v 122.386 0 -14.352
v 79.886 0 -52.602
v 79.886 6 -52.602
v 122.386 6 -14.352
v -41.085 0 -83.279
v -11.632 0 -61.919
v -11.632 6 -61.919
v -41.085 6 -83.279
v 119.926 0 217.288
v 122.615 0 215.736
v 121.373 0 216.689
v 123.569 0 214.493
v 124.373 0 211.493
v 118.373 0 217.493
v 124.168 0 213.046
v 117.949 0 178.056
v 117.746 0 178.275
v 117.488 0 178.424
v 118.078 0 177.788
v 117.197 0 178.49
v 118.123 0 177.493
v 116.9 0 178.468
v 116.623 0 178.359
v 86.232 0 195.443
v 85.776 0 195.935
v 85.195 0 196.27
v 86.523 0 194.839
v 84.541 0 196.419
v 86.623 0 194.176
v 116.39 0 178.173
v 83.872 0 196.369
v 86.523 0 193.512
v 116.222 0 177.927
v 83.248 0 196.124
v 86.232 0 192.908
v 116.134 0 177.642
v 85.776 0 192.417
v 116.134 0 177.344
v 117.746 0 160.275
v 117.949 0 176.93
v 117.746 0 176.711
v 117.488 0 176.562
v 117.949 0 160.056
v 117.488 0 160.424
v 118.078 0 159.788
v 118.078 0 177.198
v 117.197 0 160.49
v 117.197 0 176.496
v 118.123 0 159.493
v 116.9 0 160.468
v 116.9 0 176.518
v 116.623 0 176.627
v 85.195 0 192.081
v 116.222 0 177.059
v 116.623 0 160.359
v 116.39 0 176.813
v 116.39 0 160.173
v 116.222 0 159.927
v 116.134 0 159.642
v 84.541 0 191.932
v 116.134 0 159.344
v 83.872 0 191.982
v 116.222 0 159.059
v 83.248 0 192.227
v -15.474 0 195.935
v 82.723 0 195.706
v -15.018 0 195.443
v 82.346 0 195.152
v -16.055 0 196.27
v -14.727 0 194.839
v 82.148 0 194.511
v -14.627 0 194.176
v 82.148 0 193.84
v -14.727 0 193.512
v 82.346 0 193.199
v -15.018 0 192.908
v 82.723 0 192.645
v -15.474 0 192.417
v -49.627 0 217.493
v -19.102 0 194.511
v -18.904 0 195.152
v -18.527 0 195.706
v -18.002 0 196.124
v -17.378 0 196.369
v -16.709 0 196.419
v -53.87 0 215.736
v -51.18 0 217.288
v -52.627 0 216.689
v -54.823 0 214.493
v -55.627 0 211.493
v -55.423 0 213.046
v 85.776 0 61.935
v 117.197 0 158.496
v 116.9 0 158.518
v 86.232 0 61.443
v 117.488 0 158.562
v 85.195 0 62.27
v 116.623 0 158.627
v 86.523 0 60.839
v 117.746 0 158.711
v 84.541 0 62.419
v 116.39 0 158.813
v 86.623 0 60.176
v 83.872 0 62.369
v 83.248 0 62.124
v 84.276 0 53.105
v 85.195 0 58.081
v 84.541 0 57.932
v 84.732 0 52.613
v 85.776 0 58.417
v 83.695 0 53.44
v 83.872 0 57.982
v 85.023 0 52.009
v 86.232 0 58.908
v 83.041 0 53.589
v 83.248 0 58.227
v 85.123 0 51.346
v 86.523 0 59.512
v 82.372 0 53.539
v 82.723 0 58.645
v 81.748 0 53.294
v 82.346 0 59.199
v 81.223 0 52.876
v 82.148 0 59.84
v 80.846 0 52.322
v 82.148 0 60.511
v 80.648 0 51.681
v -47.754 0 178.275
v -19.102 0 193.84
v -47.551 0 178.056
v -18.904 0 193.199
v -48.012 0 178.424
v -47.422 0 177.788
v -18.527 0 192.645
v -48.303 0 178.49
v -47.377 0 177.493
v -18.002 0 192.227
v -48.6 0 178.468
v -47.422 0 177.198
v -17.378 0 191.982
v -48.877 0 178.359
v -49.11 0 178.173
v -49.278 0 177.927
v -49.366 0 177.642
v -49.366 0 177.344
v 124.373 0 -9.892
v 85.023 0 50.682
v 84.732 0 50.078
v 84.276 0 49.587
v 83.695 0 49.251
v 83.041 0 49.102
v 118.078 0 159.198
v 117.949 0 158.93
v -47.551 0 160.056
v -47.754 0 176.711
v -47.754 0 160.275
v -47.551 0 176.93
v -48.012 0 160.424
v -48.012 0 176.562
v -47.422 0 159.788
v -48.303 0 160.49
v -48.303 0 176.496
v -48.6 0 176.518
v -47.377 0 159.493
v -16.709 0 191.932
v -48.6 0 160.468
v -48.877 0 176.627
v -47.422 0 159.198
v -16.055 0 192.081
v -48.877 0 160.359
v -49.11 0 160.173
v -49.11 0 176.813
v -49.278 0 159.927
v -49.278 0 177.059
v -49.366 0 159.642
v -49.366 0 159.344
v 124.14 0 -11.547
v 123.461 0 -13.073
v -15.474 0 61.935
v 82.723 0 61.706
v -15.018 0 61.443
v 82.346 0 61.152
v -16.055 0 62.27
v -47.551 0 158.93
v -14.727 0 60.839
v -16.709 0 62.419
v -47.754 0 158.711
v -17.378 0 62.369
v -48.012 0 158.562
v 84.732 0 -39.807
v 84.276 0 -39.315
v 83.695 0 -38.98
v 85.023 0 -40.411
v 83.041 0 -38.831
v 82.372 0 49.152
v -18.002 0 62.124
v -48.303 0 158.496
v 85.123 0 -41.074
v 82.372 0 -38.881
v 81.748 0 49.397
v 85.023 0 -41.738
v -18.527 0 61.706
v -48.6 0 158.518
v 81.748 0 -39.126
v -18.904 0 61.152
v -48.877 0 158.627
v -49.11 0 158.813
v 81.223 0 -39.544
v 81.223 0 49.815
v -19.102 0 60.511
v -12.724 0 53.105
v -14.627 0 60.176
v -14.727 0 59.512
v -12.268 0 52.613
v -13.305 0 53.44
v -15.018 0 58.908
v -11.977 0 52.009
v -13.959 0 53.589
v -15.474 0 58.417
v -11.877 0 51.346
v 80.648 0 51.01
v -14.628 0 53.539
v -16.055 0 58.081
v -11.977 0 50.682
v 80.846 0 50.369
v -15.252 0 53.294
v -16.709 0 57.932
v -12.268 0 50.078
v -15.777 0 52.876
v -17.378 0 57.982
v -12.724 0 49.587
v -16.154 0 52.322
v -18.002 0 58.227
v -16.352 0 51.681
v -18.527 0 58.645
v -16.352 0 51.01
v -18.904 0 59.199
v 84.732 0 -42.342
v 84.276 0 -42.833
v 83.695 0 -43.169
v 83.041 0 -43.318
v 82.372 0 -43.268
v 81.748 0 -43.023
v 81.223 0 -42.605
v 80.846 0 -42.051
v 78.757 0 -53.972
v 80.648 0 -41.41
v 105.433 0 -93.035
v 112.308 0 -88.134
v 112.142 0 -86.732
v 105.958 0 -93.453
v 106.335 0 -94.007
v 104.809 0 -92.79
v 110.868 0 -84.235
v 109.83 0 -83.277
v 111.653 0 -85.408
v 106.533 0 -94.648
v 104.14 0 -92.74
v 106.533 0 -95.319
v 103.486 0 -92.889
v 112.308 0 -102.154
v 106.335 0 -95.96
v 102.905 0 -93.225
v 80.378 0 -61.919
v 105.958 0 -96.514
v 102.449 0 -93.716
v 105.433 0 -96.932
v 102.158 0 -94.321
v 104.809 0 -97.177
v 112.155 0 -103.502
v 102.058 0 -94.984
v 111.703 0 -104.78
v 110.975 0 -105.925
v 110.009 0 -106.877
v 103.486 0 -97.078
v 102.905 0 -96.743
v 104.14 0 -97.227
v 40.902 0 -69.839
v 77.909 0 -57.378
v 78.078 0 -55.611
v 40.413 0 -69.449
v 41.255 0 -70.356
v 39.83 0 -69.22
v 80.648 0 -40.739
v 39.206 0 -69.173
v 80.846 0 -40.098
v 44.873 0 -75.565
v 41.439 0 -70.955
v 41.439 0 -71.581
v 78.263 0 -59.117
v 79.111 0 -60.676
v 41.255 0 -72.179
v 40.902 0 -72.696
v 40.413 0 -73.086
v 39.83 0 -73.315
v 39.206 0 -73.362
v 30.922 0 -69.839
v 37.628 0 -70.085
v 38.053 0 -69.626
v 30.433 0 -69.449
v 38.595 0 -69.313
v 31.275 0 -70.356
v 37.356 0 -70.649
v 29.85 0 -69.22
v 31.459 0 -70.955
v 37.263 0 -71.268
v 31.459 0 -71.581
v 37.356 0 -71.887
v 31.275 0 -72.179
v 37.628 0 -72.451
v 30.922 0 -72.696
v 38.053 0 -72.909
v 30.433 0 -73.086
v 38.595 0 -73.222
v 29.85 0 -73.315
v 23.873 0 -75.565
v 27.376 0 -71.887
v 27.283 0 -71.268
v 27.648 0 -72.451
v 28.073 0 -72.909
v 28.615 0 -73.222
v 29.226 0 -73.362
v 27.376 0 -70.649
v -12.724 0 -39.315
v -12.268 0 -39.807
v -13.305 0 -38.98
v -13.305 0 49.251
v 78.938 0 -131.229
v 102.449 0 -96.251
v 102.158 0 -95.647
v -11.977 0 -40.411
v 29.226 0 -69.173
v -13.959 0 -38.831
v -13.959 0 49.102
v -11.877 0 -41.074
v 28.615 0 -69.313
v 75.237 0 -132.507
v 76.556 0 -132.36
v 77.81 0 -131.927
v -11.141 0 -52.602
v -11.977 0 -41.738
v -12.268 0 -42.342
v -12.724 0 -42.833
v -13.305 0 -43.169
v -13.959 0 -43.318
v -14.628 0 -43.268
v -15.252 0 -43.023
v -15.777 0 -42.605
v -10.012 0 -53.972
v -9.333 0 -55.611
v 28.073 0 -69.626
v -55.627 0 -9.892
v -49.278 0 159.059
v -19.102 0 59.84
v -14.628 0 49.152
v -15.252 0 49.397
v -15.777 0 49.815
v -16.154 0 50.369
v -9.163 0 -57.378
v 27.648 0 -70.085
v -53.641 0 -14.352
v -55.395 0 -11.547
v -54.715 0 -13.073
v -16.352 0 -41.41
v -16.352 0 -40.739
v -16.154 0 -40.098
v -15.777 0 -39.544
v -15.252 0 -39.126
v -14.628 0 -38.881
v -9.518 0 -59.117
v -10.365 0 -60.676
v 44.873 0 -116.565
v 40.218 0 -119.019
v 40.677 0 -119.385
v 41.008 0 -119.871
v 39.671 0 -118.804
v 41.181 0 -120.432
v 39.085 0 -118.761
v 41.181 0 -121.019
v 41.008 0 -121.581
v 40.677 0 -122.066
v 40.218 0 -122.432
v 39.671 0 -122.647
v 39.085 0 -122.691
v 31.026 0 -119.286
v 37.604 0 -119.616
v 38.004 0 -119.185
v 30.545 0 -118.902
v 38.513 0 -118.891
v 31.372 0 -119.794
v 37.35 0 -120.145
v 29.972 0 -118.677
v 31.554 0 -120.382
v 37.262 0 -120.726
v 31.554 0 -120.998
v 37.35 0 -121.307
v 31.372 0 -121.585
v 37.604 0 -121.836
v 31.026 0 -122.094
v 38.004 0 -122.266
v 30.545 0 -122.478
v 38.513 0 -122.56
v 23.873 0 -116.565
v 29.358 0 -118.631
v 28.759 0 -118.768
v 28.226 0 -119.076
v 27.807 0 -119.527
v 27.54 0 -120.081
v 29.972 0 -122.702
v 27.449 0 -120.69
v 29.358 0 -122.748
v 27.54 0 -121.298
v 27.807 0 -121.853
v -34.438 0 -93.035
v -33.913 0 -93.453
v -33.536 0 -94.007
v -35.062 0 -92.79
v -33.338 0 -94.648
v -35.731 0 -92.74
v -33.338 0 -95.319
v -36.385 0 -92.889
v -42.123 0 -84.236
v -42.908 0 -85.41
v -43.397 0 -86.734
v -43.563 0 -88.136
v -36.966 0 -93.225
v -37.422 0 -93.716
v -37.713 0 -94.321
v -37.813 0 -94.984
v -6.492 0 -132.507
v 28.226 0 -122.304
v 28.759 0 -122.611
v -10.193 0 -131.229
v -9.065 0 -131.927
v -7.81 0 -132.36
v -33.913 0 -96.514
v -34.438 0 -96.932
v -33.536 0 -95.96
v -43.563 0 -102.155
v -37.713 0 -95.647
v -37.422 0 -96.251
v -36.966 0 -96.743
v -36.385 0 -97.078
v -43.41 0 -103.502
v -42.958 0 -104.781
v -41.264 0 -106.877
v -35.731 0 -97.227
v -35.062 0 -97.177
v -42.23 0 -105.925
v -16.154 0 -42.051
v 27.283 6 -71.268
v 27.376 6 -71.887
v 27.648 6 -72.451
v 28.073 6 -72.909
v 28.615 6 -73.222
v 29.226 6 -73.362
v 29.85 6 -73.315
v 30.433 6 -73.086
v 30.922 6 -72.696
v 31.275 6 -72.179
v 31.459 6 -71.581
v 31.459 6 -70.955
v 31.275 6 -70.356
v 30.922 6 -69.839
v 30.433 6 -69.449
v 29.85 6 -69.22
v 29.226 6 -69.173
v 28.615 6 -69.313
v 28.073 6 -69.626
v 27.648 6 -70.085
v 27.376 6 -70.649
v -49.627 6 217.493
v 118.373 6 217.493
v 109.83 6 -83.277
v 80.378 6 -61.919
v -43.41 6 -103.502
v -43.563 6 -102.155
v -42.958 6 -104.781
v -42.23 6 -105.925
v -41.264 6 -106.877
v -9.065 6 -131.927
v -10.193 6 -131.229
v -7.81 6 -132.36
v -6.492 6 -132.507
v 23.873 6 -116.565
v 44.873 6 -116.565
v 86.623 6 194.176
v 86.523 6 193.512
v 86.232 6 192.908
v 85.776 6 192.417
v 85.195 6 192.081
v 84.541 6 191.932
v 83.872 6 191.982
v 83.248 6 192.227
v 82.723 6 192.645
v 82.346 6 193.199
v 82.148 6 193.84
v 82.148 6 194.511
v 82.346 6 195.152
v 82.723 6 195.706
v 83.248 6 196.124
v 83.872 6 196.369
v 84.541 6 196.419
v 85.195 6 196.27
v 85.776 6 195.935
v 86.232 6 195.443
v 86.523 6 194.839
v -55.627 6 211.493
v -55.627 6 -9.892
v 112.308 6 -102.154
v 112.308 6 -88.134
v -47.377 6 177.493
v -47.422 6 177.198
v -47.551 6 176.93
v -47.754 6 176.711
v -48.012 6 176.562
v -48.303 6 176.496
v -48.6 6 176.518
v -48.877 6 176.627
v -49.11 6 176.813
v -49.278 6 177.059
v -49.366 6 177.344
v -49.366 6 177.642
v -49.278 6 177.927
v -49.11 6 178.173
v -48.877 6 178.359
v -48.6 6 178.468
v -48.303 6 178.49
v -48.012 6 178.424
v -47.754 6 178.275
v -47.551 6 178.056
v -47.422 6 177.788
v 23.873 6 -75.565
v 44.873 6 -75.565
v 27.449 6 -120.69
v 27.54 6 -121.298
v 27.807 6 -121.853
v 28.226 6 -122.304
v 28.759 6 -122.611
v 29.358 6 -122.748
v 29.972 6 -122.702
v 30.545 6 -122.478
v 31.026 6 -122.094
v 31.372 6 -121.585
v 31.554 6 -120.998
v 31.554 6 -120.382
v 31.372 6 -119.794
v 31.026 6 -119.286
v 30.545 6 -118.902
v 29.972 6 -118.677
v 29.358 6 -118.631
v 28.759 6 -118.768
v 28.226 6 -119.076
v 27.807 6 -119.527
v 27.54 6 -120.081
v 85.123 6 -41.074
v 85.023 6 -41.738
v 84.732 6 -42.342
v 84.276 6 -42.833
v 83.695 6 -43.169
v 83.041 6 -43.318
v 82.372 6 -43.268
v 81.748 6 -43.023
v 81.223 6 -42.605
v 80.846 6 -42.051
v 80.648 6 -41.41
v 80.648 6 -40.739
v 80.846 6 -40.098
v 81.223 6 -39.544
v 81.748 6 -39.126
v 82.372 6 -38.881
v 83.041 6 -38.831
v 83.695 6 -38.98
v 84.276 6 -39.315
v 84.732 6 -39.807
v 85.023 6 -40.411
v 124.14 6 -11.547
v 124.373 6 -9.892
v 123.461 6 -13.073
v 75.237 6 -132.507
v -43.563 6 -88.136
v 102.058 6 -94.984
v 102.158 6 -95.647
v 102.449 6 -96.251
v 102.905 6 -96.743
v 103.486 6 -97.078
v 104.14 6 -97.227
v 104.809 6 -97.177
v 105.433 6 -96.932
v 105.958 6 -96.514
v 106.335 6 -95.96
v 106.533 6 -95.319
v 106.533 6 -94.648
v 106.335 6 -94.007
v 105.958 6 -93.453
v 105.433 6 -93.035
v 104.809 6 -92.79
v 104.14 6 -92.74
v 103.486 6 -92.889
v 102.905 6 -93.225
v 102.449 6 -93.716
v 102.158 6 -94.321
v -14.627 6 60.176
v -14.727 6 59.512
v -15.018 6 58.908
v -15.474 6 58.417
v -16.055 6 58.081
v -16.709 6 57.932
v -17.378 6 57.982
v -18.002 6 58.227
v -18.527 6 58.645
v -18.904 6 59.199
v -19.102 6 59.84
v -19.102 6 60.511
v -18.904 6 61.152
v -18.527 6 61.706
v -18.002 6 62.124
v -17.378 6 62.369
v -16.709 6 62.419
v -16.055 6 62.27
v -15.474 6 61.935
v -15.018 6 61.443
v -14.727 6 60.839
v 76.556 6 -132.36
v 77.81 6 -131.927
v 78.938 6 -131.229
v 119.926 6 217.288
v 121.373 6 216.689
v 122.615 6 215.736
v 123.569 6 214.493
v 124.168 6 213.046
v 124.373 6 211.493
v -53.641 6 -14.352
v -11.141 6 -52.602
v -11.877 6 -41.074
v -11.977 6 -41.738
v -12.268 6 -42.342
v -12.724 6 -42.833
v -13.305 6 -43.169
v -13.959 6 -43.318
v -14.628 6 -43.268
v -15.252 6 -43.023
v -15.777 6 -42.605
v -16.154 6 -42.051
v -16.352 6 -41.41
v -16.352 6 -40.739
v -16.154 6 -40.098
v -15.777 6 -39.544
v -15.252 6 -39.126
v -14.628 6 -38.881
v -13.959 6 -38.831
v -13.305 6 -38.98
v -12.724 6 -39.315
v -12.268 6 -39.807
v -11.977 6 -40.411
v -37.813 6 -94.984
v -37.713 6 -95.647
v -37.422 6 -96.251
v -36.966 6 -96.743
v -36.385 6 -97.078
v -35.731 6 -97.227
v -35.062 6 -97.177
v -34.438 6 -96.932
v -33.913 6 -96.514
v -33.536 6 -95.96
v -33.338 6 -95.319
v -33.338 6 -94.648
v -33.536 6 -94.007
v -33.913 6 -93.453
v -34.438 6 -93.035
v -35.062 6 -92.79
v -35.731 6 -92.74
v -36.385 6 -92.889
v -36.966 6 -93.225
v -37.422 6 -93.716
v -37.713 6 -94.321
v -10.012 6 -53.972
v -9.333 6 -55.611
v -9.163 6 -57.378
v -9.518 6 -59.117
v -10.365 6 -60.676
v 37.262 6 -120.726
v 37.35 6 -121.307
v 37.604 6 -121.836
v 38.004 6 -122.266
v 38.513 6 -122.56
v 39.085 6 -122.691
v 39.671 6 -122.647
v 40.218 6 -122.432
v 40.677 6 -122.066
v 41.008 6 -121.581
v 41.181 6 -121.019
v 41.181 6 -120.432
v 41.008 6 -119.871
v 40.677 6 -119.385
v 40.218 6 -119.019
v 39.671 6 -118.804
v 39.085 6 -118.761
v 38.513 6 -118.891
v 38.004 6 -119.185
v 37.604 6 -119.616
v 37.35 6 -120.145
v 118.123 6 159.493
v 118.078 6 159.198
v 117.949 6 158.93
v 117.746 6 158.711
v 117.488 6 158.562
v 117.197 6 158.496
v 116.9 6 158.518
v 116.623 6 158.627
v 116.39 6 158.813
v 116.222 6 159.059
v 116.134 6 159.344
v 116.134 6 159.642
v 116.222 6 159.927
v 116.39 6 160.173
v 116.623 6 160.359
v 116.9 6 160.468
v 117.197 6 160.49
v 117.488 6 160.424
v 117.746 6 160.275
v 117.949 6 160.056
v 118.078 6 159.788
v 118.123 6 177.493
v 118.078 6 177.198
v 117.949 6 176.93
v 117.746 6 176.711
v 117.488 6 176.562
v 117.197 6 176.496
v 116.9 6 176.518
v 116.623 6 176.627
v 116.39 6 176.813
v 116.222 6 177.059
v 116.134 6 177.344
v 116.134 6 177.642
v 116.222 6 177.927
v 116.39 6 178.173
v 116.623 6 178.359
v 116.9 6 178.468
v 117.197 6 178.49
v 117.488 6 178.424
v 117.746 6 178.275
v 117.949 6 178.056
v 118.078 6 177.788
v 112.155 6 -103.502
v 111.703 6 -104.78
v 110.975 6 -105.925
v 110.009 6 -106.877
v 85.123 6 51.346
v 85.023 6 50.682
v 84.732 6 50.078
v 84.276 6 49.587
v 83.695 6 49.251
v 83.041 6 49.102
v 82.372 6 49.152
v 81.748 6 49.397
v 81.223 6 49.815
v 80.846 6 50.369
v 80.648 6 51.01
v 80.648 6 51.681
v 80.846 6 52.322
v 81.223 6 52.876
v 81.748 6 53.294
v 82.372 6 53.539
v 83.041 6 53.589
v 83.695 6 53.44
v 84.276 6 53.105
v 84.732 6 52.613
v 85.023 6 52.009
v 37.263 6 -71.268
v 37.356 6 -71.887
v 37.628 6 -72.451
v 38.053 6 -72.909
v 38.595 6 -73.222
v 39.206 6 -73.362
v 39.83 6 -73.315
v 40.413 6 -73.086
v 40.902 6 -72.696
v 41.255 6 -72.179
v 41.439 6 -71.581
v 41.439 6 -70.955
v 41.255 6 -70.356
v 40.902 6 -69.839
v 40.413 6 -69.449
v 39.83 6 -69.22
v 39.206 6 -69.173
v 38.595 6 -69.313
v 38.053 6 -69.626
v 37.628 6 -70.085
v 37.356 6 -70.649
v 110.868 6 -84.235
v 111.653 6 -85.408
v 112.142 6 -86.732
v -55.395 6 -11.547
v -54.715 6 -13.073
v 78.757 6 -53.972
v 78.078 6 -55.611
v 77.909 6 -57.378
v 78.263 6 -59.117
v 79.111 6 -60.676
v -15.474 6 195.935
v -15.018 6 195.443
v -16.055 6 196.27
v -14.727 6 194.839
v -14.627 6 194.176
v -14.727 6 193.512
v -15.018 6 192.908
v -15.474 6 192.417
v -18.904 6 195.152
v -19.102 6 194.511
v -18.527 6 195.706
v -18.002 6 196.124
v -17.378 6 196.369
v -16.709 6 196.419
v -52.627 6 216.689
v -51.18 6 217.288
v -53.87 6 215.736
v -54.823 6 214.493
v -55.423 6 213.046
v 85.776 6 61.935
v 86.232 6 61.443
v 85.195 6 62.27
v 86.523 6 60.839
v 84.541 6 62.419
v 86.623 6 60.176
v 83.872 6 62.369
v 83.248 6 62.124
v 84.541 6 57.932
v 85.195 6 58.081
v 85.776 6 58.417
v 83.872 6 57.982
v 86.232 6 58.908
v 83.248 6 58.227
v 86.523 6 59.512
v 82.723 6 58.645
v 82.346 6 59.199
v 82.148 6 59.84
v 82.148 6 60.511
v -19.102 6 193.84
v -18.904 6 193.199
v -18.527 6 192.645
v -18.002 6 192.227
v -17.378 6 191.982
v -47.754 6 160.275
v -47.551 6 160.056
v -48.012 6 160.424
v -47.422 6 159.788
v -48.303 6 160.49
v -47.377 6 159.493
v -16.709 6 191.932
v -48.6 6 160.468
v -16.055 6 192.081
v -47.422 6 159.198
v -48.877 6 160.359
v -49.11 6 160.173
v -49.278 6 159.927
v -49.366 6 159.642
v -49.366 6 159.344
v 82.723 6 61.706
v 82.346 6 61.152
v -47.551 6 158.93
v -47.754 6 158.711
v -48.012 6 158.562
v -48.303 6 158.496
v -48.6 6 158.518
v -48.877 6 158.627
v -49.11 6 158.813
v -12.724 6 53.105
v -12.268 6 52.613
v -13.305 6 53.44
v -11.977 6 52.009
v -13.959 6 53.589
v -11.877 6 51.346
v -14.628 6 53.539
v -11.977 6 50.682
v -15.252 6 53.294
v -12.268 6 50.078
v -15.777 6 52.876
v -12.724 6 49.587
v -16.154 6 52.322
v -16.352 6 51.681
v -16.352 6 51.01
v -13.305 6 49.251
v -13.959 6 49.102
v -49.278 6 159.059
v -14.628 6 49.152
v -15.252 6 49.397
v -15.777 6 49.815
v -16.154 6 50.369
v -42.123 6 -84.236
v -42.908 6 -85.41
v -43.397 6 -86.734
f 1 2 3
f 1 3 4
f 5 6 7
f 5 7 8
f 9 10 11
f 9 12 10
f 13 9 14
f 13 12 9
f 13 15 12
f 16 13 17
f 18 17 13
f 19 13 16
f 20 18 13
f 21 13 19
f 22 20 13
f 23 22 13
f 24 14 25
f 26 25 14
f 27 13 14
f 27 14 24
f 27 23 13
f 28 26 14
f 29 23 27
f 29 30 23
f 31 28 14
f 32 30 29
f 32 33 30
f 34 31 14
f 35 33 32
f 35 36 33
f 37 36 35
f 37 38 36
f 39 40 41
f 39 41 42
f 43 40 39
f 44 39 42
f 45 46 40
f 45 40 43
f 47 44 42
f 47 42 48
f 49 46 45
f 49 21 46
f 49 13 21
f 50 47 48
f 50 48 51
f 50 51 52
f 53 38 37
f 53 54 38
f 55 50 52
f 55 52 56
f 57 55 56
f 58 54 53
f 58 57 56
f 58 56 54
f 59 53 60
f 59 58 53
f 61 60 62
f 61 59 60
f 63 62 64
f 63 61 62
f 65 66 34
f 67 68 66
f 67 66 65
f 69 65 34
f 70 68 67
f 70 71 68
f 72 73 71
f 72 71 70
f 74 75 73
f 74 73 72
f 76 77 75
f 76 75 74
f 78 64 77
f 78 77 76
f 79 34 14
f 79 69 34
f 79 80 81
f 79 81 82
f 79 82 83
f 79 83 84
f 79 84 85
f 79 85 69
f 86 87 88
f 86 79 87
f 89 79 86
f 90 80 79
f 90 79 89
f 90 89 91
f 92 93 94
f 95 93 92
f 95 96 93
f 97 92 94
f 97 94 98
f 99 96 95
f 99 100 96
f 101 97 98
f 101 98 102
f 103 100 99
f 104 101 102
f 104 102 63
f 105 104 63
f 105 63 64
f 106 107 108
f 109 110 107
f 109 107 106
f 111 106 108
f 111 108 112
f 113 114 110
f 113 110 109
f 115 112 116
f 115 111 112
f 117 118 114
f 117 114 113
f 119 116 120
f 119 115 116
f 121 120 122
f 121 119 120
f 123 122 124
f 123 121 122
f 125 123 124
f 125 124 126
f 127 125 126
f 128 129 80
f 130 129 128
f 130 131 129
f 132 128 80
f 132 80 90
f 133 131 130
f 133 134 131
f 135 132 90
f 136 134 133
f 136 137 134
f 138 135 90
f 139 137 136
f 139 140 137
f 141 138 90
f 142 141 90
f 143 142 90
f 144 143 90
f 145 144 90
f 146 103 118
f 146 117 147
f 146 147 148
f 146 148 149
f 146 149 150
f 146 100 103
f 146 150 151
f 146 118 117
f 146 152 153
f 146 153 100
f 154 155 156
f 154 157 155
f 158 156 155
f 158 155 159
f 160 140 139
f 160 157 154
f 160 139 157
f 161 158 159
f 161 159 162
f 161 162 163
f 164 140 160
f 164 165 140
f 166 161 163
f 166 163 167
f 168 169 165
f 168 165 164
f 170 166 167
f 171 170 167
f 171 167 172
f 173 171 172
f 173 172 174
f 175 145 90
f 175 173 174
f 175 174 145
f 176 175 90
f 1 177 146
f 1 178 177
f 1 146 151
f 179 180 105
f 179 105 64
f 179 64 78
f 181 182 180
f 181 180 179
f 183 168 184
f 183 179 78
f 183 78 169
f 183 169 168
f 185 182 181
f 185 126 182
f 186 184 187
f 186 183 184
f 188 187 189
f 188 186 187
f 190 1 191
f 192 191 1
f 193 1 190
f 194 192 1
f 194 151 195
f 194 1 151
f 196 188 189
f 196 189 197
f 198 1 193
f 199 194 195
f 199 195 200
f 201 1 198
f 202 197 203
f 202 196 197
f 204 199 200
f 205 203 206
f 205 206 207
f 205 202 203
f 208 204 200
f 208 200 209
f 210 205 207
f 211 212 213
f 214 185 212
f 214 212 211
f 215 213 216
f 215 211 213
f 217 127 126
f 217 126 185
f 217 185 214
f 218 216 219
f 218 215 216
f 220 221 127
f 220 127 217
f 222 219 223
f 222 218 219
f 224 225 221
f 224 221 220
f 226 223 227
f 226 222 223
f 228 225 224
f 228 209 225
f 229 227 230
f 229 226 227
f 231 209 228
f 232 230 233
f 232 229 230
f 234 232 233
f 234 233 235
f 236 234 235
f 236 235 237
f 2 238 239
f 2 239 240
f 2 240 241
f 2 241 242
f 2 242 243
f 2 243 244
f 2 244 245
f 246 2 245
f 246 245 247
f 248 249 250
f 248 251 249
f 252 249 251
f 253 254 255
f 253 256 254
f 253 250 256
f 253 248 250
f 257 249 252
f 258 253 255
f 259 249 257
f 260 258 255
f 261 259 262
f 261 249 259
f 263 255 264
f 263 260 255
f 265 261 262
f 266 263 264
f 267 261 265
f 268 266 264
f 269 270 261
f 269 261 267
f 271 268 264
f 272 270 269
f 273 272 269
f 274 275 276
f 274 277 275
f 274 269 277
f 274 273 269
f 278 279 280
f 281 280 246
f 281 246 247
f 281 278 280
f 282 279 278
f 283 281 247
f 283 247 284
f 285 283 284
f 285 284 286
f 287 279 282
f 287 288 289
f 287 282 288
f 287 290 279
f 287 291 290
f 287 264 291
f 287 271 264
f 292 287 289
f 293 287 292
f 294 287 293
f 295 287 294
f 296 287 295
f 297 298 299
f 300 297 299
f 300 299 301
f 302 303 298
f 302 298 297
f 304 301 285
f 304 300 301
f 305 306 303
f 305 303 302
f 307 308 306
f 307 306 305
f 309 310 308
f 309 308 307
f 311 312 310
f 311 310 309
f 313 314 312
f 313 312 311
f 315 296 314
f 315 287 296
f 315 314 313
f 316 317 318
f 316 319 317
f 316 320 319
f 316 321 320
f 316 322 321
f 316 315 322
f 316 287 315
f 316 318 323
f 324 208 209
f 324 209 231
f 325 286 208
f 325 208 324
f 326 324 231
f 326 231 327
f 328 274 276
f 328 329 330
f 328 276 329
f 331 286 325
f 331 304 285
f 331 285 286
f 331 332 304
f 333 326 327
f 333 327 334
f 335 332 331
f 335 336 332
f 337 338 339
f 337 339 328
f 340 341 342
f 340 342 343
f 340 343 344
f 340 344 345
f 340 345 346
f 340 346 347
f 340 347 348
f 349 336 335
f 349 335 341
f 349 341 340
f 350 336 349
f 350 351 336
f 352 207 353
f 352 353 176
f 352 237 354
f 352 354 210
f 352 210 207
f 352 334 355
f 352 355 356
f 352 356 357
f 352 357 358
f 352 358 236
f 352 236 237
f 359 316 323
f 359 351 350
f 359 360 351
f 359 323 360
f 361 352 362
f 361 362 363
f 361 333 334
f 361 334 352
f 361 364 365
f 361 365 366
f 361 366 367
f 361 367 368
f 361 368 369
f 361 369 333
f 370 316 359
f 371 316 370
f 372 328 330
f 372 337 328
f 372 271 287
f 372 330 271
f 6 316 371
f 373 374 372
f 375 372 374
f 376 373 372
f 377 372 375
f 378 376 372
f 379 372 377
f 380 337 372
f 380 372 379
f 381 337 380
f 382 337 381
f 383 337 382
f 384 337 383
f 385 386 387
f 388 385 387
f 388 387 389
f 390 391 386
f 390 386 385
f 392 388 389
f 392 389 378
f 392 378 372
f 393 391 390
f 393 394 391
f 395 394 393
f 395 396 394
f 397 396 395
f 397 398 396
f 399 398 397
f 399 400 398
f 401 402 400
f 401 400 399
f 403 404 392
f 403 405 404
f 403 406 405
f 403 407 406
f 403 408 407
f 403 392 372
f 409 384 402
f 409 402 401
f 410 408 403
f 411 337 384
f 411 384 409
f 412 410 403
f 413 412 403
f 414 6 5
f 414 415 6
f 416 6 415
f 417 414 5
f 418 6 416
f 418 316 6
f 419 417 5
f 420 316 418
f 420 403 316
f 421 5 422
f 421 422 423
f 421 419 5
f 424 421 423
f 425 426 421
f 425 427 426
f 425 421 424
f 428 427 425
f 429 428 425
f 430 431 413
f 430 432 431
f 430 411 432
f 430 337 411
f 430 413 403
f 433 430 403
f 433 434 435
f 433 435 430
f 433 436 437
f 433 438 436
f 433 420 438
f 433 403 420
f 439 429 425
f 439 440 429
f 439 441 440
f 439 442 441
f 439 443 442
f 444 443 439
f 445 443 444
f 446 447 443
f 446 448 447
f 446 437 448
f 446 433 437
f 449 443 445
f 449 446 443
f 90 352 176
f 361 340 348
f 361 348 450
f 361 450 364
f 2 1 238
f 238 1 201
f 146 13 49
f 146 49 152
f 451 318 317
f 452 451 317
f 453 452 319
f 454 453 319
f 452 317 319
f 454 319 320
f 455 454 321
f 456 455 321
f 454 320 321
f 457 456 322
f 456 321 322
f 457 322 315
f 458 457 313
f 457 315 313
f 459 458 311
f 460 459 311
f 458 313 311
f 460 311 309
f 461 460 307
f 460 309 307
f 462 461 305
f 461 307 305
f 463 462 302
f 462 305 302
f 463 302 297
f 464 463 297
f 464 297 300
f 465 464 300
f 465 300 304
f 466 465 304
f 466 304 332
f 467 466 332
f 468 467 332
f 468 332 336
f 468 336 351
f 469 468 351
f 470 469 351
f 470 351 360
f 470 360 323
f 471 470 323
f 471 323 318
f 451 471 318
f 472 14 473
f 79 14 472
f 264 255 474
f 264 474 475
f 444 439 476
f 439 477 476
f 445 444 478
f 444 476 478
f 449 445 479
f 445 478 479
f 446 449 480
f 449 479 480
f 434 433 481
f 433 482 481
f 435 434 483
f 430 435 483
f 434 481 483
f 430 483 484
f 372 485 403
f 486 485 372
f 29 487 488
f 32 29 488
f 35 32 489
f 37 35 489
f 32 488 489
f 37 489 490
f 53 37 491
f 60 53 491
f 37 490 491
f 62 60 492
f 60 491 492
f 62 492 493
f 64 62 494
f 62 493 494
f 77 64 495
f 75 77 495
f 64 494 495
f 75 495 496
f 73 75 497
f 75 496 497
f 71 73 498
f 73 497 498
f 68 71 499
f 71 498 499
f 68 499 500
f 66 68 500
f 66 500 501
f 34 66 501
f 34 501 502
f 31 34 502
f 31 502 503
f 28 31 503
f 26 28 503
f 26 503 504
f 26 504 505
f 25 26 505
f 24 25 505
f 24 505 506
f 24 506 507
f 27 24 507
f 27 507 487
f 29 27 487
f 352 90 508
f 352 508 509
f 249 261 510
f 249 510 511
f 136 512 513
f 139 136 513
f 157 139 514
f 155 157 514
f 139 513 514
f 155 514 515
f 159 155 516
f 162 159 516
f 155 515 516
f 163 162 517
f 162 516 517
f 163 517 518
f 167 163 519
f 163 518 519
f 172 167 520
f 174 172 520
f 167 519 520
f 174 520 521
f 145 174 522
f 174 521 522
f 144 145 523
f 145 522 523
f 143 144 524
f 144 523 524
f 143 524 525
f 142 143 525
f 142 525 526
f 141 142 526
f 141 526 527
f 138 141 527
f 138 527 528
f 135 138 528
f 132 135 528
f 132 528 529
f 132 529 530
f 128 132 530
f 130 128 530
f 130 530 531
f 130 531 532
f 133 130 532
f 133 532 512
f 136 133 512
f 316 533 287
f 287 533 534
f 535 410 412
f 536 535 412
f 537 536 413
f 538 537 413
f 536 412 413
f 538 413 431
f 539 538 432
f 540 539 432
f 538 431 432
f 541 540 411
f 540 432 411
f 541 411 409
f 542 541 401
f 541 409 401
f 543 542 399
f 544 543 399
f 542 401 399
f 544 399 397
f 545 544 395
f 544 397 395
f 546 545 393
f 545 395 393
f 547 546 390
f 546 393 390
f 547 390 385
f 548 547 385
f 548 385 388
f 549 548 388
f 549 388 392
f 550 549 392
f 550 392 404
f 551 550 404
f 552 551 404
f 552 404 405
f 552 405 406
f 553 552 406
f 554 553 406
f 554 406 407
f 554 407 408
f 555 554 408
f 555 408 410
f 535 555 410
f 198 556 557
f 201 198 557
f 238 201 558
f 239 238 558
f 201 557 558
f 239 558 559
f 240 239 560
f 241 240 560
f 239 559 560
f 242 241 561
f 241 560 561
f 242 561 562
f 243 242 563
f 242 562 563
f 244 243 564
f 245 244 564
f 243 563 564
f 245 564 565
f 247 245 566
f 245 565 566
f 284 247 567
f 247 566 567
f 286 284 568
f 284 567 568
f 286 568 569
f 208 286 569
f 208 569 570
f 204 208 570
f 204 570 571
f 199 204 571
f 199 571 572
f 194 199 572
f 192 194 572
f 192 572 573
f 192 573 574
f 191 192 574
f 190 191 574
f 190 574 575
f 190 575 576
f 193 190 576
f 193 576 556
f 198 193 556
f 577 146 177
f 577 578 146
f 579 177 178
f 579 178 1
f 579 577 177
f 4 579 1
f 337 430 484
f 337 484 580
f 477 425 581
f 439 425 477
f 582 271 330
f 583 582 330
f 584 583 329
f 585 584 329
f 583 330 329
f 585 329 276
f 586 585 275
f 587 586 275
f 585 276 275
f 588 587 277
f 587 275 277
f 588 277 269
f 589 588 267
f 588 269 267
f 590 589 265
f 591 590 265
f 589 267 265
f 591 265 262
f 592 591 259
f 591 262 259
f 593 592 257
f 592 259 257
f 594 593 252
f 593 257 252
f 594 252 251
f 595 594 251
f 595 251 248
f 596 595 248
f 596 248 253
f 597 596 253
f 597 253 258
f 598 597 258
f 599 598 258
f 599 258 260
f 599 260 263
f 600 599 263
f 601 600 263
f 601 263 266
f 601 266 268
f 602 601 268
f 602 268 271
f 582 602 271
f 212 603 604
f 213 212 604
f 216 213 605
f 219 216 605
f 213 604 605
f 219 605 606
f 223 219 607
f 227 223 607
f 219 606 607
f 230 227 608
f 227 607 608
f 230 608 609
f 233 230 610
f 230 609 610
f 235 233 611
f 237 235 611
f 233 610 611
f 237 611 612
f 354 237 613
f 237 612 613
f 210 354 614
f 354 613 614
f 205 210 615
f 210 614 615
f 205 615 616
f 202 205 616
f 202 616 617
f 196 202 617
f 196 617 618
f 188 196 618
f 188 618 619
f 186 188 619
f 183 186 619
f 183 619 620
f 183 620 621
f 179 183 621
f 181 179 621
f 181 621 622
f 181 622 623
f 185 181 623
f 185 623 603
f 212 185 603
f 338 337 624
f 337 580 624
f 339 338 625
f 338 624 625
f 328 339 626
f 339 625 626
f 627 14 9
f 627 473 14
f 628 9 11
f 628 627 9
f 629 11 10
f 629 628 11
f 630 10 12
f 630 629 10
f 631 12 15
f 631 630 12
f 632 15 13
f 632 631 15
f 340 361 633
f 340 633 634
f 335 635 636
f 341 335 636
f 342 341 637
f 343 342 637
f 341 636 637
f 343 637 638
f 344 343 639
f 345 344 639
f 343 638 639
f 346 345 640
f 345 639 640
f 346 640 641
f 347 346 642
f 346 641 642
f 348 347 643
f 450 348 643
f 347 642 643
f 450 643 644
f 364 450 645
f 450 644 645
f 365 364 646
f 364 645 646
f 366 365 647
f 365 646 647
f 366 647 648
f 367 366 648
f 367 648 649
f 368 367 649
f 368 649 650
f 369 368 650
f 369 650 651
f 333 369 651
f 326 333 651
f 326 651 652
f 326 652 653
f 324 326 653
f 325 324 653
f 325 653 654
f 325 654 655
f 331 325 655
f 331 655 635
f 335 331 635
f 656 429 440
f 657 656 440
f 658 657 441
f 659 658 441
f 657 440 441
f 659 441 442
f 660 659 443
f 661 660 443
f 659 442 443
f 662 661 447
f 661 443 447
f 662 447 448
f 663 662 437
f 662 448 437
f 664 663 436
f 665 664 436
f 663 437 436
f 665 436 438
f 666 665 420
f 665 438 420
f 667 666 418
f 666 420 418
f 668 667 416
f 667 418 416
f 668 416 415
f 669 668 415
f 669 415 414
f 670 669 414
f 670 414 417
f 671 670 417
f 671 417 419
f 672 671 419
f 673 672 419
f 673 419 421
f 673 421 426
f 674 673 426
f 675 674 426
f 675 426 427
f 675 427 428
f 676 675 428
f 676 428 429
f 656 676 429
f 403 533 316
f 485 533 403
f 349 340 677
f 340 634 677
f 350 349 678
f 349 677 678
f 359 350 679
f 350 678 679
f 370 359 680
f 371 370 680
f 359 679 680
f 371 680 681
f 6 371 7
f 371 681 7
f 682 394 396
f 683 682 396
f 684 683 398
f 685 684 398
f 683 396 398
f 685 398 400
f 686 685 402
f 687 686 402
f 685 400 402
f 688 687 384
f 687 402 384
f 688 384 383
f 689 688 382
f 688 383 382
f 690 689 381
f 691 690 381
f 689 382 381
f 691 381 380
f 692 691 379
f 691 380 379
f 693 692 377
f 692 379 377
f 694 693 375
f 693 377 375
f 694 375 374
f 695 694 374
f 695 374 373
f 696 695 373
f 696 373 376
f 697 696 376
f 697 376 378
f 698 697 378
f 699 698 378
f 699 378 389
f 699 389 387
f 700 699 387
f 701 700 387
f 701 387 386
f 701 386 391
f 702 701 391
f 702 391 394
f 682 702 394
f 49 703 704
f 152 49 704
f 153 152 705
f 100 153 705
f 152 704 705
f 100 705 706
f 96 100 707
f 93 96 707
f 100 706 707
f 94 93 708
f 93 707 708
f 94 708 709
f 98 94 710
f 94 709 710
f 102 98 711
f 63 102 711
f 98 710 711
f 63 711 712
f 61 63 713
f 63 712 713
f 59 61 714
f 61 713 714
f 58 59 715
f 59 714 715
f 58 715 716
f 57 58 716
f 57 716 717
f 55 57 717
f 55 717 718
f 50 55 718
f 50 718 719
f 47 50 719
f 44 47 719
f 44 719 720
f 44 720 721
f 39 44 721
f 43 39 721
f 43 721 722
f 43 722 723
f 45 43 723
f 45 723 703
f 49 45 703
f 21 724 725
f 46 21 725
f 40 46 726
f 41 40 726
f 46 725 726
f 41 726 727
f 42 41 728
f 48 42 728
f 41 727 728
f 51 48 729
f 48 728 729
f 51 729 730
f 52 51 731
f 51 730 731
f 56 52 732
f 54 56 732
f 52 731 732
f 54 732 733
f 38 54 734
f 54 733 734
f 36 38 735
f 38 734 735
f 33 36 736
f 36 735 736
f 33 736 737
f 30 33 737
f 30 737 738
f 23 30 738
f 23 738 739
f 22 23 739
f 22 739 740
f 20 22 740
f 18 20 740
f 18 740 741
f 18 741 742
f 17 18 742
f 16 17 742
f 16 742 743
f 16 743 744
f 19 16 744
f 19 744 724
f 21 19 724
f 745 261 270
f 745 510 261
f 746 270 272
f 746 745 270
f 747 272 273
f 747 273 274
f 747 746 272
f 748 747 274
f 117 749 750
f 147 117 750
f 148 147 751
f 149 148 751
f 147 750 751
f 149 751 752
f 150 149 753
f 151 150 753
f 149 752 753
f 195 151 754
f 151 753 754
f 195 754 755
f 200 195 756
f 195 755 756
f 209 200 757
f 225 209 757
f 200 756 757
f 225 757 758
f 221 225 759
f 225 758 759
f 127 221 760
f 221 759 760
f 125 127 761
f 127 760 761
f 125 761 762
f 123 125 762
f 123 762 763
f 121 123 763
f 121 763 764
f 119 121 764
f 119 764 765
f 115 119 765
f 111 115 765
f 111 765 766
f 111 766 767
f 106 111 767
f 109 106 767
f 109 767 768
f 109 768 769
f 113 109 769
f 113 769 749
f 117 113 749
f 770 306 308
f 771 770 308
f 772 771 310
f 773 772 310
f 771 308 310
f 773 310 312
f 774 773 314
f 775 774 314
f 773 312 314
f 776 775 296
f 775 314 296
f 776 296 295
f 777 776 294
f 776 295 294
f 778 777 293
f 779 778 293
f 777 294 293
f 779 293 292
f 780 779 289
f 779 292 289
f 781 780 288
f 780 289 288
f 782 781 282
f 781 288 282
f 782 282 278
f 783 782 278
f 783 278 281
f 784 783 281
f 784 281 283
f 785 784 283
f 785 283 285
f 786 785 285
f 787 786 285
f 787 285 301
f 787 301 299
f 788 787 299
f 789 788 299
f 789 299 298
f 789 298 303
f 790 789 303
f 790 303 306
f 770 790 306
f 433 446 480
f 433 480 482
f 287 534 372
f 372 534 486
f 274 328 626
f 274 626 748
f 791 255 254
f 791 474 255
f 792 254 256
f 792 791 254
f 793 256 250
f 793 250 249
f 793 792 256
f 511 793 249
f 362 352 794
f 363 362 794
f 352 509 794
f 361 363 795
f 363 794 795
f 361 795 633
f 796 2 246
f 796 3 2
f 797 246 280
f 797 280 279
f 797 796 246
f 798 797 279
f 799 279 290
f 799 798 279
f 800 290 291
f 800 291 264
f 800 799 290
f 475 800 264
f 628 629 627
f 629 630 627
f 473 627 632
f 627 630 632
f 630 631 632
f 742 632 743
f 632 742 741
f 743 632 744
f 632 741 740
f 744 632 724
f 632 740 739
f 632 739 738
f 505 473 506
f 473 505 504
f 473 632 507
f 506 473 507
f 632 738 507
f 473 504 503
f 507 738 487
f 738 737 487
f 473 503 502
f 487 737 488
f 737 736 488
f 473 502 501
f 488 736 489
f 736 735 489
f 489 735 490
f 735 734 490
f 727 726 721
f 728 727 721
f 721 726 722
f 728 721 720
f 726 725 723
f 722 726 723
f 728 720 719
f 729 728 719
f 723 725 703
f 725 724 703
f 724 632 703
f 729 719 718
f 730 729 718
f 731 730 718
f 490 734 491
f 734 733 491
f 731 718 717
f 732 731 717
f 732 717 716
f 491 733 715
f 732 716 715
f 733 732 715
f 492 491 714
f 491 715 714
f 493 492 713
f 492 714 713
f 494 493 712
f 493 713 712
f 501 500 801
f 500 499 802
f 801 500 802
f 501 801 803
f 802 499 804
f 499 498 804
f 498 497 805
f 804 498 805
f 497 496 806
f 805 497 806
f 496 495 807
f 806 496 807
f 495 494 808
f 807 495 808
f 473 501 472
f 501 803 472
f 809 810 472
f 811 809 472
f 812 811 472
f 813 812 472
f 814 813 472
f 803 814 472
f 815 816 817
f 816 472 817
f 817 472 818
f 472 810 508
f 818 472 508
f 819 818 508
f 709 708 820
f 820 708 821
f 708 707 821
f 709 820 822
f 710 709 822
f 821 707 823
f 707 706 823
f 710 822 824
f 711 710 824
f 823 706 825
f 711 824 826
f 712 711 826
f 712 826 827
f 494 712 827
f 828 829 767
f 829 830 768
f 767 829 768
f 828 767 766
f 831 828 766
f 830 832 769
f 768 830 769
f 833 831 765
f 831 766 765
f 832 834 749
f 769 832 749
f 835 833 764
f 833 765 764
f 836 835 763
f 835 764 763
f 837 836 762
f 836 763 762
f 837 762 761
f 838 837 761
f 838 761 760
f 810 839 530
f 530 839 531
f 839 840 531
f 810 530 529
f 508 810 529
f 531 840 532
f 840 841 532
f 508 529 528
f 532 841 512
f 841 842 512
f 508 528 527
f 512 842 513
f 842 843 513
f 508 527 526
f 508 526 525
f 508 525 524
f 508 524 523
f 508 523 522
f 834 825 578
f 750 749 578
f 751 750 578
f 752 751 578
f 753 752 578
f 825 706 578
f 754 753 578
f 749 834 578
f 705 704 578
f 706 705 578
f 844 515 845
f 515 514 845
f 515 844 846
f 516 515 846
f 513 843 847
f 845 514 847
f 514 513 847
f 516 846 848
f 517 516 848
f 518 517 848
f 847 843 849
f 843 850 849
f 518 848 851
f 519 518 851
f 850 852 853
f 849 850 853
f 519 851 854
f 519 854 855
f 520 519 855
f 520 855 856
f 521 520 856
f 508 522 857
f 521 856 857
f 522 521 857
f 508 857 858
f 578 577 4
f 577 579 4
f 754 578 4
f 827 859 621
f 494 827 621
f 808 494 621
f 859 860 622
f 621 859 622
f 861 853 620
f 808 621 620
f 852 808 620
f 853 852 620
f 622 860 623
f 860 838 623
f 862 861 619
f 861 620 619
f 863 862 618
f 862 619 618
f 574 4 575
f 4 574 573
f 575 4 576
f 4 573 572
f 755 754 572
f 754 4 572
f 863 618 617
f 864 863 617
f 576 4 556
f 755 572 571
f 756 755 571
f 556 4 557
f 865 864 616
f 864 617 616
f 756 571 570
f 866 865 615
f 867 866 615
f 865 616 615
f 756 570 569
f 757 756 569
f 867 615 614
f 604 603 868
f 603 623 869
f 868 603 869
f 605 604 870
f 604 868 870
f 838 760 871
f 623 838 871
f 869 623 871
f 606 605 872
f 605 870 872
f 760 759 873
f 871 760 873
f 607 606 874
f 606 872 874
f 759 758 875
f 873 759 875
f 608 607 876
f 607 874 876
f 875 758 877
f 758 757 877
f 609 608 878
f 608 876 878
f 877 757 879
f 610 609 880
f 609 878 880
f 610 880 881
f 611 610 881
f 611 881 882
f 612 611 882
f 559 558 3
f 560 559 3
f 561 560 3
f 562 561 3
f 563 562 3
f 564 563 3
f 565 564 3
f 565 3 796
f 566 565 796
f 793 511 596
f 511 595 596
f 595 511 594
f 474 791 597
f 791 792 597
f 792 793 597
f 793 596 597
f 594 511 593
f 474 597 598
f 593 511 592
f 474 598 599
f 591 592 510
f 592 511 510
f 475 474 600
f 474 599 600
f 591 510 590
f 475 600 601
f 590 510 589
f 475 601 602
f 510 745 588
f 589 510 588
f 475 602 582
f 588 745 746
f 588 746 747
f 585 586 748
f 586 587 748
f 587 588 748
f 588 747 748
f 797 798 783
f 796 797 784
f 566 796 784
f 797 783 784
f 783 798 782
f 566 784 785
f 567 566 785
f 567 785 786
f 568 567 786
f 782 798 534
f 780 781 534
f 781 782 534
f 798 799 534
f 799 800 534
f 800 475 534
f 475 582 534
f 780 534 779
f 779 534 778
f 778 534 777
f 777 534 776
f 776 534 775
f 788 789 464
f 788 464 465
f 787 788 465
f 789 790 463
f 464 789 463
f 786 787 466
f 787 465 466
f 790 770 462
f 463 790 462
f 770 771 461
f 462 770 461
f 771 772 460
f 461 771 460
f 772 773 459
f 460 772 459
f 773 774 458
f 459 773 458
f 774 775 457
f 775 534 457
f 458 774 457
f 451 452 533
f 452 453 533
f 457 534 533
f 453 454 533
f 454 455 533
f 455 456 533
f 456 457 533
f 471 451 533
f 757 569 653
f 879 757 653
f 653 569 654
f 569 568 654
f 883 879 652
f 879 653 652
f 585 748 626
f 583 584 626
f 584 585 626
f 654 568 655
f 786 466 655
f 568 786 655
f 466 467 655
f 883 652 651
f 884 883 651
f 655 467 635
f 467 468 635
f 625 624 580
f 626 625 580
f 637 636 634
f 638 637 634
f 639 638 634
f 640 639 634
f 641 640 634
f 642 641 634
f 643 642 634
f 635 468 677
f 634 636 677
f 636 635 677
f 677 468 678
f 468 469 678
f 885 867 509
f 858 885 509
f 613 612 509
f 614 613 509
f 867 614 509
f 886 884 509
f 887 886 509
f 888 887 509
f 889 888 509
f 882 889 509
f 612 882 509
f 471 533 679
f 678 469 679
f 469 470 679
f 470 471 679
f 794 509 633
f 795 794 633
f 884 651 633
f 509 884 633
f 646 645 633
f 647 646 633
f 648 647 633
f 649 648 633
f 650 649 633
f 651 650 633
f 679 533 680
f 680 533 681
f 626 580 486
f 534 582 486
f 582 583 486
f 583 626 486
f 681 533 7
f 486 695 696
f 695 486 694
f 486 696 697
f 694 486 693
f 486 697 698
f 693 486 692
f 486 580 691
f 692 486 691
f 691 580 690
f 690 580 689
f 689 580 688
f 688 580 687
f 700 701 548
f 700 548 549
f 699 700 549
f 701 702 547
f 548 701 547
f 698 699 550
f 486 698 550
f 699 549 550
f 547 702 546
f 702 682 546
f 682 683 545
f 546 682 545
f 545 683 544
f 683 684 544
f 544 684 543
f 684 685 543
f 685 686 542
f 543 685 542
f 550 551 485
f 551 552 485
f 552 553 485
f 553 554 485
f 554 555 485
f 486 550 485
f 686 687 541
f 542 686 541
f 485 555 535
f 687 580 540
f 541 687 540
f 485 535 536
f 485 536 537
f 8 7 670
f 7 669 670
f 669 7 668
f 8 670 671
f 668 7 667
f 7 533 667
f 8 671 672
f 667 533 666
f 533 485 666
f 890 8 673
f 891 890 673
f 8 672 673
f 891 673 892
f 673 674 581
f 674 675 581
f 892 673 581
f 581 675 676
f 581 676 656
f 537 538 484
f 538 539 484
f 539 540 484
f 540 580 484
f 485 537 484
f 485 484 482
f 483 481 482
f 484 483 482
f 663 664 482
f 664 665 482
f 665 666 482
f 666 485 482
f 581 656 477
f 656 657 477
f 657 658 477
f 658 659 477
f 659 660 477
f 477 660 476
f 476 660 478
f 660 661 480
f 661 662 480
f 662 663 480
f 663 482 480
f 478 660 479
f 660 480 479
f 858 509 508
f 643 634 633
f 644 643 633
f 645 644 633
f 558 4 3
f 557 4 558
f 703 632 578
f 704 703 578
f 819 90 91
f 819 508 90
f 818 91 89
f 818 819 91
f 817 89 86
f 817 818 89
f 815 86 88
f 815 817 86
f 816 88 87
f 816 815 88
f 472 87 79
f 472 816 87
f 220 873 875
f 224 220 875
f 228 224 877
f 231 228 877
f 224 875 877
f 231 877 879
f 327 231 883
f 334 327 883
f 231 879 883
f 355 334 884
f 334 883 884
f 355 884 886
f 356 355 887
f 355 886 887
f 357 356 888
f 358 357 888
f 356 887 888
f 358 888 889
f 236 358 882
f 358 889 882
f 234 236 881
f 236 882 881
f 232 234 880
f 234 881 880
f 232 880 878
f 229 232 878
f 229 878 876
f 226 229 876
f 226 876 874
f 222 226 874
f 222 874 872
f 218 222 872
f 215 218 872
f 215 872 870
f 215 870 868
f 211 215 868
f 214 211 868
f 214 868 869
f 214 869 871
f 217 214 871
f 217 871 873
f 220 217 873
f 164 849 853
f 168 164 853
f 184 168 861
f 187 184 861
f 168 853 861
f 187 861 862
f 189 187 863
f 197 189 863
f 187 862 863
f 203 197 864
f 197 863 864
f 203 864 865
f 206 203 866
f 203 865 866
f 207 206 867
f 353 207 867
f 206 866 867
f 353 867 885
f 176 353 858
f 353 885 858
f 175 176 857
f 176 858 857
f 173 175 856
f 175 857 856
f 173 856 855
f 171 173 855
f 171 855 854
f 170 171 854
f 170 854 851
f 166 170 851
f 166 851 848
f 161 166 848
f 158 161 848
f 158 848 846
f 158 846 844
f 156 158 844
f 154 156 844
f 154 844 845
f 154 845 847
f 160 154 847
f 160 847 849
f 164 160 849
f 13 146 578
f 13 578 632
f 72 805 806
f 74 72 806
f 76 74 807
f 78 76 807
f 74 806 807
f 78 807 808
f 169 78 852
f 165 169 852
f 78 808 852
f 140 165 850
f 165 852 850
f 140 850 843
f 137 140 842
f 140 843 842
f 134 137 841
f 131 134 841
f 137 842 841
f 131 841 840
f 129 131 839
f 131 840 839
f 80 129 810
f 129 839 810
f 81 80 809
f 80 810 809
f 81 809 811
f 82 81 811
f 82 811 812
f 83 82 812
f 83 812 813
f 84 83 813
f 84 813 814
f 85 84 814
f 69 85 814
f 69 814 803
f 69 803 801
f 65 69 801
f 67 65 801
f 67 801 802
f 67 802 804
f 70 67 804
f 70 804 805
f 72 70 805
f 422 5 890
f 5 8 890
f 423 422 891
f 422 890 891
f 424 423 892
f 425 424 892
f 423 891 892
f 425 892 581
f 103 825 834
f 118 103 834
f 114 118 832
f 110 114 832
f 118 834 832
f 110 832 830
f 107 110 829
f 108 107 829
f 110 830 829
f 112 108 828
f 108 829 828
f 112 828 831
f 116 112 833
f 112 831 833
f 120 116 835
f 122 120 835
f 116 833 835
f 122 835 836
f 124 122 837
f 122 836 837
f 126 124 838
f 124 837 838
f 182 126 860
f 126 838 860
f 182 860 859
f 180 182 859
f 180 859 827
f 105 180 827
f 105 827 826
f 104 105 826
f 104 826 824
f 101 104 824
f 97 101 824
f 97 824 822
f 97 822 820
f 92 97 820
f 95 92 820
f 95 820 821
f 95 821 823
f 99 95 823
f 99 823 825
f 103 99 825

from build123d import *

# Parameters (mm, degrees)
SALIENTE_EXTRUIR1_DEPTH = 6
CROQUIS2_W              = 21
CROQUIS2_H              = 41
CORTAR_EXTRUIR1_DEPTH   = 10
CROQUIS3_R              = 1
CORTAR_EXTRUIR2_DEPTH   = 10
CROQUIS4_R              = 2.25
CORTAR_EXTRUIR3_DEPTH   = 10
CROQUIS5_R              = 2.25
CORTAR_EXTRUIR4_DEPTH   = 10
CROQUIS9_R              = 2.25
CORTAR_EXTRUIR6_DEPTH   = 29
CROQUIS6_R              = 2.064168912
CROQUIS6_R_2            = 1.970714146
CROQUIS6_R_3            = 2.1
CORTAR_EXTRUIR7_DEPTH   = 10
REDONDEO1_R             = 6


with BuildPart() as part:
    # Croquis1 → Saliente-Extruir1 (new body)
    with BuildSketch(Plane(origin=(0, 0, 0), x_dir=(1, 0, 0), z_dir=(0, 1, 0))):
        Polygon((-55.627306273, -217.492892842), (-55.627306273, 12.564575646), (-5.627306273, 57.564575646), (-43.56277397, 85.075402887), (-43.56277397, 105.075421235), (-8.56277397, 132.507107158), (77.308161424, 132.507107158), (112.308161424, 105.074865922), (112.308161424, 85.073844823), (74.372693727, 57.564575646), (124.372693727, 12.564575646), (124.372693727, -217.492892842), align=None)
    extrude(amount=SALIENTE_EXTRUIR1_DEPTH)

    # Croquis2 → Cortar-Extruir1 (cut)
    with BuildSketch(Plane(origin=(0, 6, 0), x_dir=(1, 0, 0), z_dir=(0, 1, 0))):
        with Locations((34.372693727, 96.064575646)):
            Rectangle(CROQUIS2_W, CROQUIS2_H)
    extrude(amount=-CORTAR_EXTRUIR1_DEPTH, mode=Mode.SUBTRACT)

    # Croquis3 → Cortar-Extruir2 (cut)
    with BuildSketch(Plane(origin=(0, 6, 0), x_dir=(1, 0, 0), z_dir=(0, 1, 0))):
        with Locations((117.122693727, -177.492892842)):
            Circle(CROQUIS3_R)
        with Locations((117.122693727, -159.492892842)):
            Circle(CROQUIS3_R)
        with Locations((-48.377306273, -159.492892842)):
            Circle(CROQUIS3_R)
        with Locations((-48.377306273, -177.492892842)):
            Circle(CROQUIS3_R)
    extrude(amount=-CORTAR_EXTRUIR2_DEPTH, mode=Mode.SUBTRACT)

    # Croquis4 → Cortar-Extruir3 (cut)
    with BuildSketch(Plane(origin=(0, 6, 0), x_dir=(1, 0, 0), z_dir=(0, 1, 0))):
        with Locations((-16.877306273, -194.17563761)):
            Circle(CROQUIS4_R)
        with Locations((-16.877306273, -60.17563761)):
            Circle(CROQUIS4_R)
        with Locations((84.372693727, -60.17563761)):
            Circle(CROQUIS4_R)
        with Locations((84.372693727, -194.17563761)):
            Circle(CROQUIS4_R)
    extrude(amount=-CORTAR_EXTRUIR3_DEPTH, mode=Mode.SUBTRACT)

    # Croquis5 → Cortar-Extruir4 (cut)
    with BuildSketch(Plane(origin=(0, 6, 0), x_dir=(1, 0, 0), z_dir=(0, 1, 0))):
        with Locations((82.872693727, -51.34563761)):
            Circle(CROQUIS5_R)
        with Locations((-14.127306273, -51.34563761)):
            Circle(CROQUIS5_R)
        with Locations((-14.127306273, 41.07436239)):
            Circle(CROQUIS5_R)
        with Locations((82.872693727, 41.07436239)):
            Circle(CROQUIS5_R)
    extrude(amount=-CORTAR_EXTRUIR4_DEPTH, mode=Mode.SUBTRACT)

    # Croquis9 → Cortar-Extruir6 (cut)
    with BuildSketch(Plane(origin=(0, 0, 0), x_dir=(-1, 0, 0), z_dir=(0, -1, 0))):
        with Locations((-104.308161424, 94.983735042)):
            Circle(CROQUIS9_R)
        with Locations((35.56277397, 94.983735042)):
            Circle(CROQUIS9_R)
    extrude(amount=-CORTAR_EXTRUIR6_DEPTH, mode=Mode.SUBTRACT)

    # Croquis6 → Cortar-Extruir7 (cut)
    with BuildSketch(Plane(origin=(0, 0, 0), x_dir=(-1, 0, 0), z_dir=(0, -1, 0))):
        with Locations((-29.512693727, 120.689890176)):
            Circle(CROQUIS6_R)
        with Locations((-39.232693727, 120.725721264)):
            Circle(CROQUIS6_R_2)
        with Locations((-39.362693727, 71.26759894)):
            Circle(CROQUIS6_R_3)
        with Locations((-29.382693727, 71.26759894)):
            Circle(CROQUIS6_R_3)
    extrude(amount=-CORTAR_EXTRUIR7_DEPTH, mode=Mode.SUBTRACT)

    # Redondeo1
    redondeo1_edges = [part.edges().sort_by_distance(p)[0] for p in [
        (-55.627306273, 3, 217.492892842),
        (-55.627306273, 3, -12.564575646),
        (-5.627306273, 3, -57.564575646),
        (-43.56277397, 3, -85.075402887),
        (-43.56277397, 3, -105.075421235),
        (-8.56277397, 3, -132.507107158),
        (77.308161424, 3, -132.507107158),
        (112.308161424, 3, -105.074865922),
        (112.308161424, 3, -85.073844823),
        (74.372693727, 3, -57.564575646),
        (124.372693727, 3, -12.564575646),
        (124.372693727, 3, 217.492892842),
    ]]
    fillet(redondeo1_edges, radius=REDONDEO1_R)


solid = part.part
